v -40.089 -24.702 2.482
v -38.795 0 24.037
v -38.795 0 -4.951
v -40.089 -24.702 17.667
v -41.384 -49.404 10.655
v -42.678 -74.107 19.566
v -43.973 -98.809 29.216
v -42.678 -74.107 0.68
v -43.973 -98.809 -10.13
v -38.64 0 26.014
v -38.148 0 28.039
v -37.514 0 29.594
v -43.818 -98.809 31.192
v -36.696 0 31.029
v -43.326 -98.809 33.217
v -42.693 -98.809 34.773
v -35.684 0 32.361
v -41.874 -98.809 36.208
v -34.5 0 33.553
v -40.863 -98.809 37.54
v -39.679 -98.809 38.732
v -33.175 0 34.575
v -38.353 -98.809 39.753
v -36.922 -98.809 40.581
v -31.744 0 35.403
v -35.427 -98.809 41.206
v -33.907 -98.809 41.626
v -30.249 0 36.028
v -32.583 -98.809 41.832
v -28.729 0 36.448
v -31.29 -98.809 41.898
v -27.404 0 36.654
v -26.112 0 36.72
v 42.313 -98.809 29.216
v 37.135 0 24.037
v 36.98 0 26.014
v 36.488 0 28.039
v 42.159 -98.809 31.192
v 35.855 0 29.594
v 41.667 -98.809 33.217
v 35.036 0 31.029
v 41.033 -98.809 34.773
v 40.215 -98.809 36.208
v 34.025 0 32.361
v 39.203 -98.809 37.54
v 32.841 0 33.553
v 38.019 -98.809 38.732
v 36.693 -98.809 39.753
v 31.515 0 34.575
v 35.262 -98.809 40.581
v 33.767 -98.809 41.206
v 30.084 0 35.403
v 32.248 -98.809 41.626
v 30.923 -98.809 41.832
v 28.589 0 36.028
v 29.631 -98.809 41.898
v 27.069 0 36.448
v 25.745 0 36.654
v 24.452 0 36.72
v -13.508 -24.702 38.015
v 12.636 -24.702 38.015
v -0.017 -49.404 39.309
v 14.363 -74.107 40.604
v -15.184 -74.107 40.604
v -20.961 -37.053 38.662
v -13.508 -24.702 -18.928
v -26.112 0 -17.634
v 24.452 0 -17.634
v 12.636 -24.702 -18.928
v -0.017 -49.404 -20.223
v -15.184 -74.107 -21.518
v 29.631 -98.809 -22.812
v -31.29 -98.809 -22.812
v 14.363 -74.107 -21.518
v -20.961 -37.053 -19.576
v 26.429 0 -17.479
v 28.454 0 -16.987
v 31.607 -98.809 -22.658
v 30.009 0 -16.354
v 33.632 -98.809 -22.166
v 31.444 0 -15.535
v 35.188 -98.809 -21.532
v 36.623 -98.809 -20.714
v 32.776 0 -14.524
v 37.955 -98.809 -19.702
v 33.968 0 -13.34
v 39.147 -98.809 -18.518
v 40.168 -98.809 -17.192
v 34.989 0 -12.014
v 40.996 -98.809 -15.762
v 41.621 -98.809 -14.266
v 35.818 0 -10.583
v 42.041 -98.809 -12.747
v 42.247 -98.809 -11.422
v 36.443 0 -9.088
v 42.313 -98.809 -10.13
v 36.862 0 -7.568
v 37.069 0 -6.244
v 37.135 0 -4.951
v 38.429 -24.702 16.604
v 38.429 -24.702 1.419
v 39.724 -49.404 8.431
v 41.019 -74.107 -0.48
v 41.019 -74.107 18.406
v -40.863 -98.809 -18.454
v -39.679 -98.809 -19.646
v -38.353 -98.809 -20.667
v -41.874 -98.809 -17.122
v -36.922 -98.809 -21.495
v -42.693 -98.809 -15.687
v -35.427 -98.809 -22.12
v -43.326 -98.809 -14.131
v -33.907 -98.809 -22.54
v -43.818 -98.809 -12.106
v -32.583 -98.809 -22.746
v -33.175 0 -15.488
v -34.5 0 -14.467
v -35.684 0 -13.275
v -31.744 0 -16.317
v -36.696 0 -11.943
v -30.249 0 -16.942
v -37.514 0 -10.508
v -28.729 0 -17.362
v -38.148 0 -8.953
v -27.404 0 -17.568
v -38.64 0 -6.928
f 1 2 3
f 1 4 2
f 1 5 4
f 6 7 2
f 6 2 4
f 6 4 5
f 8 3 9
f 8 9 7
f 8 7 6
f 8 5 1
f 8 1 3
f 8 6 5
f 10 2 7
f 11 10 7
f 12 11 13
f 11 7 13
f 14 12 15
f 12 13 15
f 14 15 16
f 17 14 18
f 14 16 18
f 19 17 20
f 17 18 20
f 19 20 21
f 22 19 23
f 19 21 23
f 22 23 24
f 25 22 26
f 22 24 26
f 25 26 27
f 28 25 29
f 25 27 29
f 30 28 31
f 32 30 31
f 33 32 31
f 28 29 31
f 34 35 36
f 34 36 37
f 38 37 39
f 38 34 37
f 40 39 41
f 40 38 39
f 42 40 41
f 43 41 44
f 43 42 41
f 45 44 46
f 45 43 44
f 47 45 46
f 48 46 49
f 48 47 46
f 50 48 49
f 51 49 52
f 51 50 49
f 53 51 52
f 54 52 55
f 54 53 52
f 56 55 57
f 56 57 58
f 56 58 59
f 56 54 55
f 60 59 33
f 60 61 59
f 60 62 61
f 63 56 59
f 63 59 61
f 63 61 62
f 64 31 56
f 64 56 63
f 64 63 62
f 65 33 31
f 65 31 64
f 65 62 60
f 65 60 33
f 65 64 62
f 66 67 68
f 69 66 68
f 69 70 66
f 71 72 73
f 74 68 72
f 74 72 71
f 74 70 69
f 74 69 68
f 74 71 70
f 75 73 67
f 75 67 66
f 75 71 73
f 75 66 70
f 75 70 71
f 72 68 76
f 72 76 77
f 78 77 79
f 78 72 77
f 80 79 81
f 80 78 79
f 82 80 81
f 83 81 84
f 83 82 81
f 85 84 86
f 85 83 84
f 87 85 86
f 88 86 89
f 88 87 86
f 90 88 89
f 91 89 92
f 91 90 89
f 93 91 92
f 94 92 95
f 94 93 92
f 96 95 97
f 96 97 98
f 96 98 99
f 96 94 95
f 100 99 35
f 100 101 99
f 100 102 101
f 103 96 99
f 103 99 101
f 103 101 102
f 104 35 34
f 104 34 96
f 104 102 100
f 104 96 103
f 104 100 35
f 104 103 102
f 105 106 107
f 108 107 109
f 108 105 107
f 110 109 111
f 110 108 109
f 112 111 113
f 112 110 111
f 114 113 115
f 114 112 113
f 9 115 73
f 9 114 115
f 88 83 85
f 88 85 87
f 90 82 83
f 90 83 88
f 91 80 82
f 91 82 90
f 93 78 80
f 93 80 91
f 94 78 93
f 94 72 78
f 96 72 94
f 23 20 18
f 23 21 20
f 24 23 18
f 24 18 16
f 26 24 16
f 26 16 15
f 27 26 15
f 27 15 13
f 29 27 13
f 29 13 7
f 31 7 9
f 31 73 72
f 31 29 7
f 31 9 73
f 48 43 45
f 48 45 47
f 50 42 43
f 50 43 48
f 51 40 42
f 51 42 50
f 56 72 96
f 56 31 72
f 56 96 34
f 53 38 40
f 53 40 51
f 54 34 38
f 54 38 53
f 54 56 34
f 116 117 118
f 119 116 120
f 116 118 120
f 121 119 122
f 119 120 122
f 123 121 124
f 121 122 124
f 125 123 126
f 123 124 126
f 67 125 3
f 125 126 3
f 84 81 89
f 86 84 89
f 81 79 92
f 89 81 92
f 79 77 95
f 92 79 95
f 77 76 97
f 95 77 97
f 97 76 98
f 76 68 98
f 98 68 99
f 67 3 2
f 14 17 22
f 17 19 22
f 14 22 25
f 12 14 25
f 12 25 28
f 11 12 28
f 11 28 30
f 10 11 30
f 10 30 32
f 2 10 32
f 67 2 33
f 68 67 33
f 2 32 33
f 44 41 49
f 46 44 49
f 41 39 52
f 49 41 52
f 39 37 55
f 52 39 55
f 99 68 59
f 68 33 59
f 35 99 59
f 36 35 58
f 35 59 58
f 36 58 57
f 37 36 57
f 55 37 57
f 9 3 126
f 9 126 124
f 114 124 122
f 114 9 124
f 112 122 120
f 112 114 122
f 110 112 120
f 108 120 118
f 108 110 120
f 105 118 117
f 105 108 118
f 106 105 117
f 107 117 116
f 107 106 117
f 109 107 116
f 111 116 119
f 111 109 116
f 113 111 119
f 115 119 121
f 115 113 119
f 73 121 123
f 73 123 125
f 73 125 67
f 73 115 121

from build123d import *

# Parameters (mm, degrees)
F0_W     = 75.9293138981
F0_H     = 54.3537810445
F1_DEPTH = 98.8087579608
F1_TAPER = -3
F2_R     = 12.7


with BuildPart() as f1:
    # F0 (on Front) → F1 (new body)
    with BuildSketch(Plane.XZ):
        with Locations((-0.829860568, 9.5430351794)):
            Rectangle(F0_W, F0_H)
    extrude(amount=F1_DEPTH, taper=F1_TAPER)

    # F2
    f2_edges = [f1.edges().sort_by_distance(p)[0] for p in [
        (39.72397, -49.404379, 39.309099),
        (-41.383691, -49.404379, 39.309099),
        (39.72397, -49.404379, -20.223029),
        (-41.383691, -49.404379, -20.223029),
    ]]
    fillet(f2_edges, radius=F2_R)


solid = f1.part
